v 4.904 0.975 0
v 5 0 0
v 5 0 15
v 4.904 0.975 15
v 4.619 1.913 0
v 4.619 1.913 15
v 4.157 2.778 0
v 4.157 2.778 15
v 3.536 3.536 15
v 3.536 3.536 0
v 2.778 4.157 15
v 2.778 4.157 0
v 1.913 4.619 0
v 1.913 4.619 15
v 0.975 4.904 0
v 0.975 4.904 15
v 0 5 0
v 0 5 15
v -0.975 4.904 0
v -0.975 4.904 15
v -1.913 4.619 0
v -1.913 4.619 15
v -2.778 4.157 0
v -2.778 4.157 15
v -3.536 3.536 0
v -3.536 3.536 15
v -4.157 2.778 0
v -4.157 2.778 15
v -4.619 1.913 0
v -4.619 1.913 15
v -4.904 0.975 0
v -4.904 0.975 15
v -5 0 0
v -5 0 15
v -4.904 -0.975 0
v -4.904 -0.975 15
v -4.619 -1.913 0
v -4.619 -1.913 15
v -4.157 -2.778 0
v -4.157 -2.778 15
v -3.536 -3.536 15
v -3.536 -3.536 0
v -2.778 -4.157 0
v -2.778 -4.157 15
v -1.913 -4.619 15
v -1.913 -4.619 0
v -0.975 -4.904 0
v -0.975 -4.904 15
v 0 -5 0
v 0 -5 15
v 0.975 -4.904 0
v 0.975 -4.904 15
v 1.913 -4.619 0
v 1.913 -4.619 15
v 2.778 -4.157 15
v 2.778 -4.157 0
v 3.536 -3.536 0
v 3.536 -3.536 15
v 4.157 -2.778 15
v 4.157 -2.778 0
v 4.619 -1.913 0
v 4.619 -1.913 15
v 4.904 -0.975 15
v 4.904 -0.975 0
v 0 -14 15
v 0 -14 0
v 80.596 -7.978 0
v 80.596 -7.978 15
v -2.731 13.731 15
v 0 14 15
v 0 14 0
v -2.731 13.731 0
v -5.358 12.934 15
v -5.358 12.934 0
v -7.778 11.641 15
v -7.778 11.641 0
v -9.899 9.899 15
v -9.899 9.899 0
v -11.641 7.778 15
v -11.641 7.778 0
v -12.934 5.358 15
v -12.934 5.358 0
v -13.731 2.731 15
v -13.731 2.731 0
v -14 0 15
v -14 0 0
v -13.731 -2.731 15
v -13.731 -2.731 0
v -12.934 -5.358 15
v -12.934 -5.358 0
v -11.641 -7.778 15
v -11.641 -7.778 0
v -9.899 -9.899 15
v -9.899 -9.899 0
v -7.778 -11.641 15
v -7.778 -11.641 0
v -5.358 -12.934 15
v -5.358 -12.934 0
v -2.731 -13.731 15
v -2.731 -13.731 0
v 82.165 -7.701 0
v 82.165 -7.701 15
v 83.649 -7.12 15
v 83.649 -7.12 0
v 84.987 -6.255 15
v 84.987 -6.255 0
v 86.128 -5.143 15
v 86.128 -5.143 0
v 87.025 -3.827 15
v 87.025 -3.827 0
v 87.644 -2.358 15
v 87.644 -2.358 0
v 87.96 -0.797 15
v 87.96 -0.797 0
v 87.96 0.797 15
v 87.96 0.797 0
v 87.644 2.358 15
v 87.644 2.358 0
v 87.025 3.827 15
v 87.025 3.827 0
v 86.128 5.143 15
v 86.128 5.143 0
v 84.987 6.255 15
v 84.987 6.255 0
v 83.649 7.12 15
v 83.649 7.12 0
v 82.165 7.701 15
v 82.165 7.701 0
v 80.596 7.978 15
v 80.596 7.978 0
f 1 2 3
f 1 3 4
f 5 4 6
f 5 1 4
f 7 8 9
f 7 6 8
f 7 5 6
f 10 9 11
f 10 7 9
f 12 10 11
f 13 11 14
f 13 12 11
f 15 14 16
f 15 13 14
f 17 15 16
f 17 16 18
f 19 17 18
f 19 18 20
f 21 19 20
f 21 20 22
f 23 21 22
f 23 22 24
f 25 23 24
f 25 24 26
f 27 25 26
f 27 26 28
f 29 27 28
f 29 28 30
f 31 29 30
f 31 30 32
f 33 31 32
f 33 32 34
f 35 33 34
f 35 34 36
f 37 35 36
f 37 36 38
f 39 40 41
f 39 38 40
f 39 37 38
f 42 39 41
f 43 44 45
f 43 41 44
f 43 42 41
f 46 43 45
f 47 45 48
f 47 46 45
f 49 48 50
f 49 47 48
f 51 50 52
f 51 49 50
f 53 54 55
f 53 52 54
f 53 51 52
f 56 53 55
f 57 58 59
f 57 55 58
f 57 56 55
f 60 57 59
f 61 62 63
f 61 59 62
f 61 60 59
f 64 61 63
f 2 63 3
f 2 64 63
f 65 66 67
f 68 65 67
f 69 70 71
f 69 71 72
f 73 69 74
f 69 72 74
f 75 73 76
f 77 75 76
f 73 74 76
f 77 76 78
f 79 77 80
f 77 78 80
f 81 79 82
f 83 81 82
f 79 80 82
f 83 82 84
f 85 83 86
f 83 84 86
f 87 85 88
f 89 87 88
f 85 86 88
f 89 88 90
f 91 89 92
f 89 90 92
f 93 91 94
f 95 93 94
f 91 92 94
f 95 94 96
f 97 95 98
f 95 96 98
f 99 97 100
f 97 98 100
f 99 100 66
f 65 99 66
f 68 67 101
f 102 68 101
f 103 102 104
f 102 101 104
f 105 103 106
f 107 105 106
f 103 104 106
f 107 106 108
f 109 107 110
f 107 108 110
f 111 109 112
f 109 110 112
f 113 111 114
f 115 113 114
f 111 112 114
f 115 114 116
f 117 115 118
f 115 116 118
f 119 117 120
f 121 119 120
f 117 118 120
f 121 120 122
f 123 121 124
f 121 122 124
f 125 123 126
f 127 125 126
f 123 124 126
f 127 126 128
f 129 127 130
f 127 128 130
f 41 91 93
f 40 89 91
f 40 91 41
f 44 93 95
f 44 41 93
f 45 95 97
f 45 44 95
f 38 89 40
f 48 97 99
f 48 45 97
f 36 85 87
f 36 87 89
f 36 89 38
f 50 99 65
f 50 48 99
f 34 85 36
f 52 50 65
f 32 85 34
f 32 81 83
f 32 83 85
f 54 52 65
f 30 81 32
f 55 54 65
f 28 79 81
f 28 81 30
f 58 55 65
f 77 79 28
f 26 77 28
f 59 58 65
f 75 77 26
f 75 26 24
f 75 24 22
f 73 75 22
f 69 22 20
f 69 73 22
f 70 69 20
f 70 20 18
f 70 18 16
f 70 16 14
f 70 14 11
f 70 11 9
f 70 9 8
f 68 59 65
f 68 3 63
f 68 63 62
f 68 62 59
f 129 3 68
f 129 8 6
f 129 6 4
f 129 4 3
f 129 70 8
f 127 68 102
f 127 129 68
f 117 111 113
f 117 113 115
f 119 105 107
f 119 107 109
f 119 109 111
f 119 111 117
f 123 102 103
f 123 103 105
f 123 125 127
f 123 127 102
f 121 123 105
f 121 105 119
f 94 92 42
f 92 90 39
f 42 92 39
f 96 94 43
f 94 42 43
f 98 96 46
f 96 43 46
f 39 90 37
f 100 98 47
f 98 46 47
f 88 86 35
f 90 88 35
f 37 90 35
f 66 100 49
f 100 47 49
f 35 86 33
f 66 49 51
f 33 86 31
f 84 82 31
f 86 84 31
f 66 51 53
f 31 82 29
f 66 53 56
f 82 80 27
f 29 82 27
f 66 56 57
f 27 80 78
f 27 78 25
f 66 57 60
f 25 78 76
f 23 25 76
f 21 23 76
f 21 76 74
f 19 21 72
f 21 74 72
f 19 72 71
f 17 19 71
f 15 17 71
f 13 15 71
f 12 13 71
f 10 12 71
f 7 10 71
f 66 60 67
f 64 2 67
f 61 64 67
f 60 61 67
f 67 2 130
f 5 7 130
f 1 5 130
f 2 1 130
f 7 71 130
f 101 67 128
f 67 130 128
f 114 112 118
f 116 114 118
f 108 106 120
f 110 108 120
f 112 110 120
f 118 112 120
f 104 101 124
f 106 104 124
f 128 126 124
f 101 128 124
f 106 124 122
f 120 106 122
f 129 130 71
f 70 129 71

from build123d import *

# Parameters (mm, degrees)
BOSS_EXTRU_1_DEPTH           = 15
ENL_V_MAT_EXTRU_1_DEPTH      = 91.360389552
ENL_V_MAT_EXTRU_1_DEPTH_BACK = 91.360389552
ESQUISSE3_R                  = 5


with BuildPart() as part:
    # Esquisse1 → Boss.-Extru.1 (new body)
    with BuildSketch(Plane.XY):
        with BuildLine():
            Line((80.596108007, 7.977760039), (0, 14))
            ThreePointArc((0, 14), (-14, 0), (0, -14))
            Line((0, -14), (80.596108007, -7.977760039))
            ThreePointArc((80.596108007, -7.977760039), (88, 0), (80.596108007, 7.977760039))
        make_face()
    extrude(amount=BOSS_EXTRU_1_DEPTH)

    # Esquisse3 → Enlèv. mat.-Extru.1 (cut, two sides: drawn at the far end of the back side and taken through both)
    with BuildSketch(Plane.XY.offset(15).offset(-ENL_V_MAT_EXTRU_1_DEPTH_BACK)):
        Circle(ESQUISSE3_R)
    extrude(amount=ENL_V_MAT_EXTRU_1_DEPTH + ENL_V_MAT_EXTRU_1_DEPTH_BACK, mode=Mode.SUBTRACT)


solid = part.part
